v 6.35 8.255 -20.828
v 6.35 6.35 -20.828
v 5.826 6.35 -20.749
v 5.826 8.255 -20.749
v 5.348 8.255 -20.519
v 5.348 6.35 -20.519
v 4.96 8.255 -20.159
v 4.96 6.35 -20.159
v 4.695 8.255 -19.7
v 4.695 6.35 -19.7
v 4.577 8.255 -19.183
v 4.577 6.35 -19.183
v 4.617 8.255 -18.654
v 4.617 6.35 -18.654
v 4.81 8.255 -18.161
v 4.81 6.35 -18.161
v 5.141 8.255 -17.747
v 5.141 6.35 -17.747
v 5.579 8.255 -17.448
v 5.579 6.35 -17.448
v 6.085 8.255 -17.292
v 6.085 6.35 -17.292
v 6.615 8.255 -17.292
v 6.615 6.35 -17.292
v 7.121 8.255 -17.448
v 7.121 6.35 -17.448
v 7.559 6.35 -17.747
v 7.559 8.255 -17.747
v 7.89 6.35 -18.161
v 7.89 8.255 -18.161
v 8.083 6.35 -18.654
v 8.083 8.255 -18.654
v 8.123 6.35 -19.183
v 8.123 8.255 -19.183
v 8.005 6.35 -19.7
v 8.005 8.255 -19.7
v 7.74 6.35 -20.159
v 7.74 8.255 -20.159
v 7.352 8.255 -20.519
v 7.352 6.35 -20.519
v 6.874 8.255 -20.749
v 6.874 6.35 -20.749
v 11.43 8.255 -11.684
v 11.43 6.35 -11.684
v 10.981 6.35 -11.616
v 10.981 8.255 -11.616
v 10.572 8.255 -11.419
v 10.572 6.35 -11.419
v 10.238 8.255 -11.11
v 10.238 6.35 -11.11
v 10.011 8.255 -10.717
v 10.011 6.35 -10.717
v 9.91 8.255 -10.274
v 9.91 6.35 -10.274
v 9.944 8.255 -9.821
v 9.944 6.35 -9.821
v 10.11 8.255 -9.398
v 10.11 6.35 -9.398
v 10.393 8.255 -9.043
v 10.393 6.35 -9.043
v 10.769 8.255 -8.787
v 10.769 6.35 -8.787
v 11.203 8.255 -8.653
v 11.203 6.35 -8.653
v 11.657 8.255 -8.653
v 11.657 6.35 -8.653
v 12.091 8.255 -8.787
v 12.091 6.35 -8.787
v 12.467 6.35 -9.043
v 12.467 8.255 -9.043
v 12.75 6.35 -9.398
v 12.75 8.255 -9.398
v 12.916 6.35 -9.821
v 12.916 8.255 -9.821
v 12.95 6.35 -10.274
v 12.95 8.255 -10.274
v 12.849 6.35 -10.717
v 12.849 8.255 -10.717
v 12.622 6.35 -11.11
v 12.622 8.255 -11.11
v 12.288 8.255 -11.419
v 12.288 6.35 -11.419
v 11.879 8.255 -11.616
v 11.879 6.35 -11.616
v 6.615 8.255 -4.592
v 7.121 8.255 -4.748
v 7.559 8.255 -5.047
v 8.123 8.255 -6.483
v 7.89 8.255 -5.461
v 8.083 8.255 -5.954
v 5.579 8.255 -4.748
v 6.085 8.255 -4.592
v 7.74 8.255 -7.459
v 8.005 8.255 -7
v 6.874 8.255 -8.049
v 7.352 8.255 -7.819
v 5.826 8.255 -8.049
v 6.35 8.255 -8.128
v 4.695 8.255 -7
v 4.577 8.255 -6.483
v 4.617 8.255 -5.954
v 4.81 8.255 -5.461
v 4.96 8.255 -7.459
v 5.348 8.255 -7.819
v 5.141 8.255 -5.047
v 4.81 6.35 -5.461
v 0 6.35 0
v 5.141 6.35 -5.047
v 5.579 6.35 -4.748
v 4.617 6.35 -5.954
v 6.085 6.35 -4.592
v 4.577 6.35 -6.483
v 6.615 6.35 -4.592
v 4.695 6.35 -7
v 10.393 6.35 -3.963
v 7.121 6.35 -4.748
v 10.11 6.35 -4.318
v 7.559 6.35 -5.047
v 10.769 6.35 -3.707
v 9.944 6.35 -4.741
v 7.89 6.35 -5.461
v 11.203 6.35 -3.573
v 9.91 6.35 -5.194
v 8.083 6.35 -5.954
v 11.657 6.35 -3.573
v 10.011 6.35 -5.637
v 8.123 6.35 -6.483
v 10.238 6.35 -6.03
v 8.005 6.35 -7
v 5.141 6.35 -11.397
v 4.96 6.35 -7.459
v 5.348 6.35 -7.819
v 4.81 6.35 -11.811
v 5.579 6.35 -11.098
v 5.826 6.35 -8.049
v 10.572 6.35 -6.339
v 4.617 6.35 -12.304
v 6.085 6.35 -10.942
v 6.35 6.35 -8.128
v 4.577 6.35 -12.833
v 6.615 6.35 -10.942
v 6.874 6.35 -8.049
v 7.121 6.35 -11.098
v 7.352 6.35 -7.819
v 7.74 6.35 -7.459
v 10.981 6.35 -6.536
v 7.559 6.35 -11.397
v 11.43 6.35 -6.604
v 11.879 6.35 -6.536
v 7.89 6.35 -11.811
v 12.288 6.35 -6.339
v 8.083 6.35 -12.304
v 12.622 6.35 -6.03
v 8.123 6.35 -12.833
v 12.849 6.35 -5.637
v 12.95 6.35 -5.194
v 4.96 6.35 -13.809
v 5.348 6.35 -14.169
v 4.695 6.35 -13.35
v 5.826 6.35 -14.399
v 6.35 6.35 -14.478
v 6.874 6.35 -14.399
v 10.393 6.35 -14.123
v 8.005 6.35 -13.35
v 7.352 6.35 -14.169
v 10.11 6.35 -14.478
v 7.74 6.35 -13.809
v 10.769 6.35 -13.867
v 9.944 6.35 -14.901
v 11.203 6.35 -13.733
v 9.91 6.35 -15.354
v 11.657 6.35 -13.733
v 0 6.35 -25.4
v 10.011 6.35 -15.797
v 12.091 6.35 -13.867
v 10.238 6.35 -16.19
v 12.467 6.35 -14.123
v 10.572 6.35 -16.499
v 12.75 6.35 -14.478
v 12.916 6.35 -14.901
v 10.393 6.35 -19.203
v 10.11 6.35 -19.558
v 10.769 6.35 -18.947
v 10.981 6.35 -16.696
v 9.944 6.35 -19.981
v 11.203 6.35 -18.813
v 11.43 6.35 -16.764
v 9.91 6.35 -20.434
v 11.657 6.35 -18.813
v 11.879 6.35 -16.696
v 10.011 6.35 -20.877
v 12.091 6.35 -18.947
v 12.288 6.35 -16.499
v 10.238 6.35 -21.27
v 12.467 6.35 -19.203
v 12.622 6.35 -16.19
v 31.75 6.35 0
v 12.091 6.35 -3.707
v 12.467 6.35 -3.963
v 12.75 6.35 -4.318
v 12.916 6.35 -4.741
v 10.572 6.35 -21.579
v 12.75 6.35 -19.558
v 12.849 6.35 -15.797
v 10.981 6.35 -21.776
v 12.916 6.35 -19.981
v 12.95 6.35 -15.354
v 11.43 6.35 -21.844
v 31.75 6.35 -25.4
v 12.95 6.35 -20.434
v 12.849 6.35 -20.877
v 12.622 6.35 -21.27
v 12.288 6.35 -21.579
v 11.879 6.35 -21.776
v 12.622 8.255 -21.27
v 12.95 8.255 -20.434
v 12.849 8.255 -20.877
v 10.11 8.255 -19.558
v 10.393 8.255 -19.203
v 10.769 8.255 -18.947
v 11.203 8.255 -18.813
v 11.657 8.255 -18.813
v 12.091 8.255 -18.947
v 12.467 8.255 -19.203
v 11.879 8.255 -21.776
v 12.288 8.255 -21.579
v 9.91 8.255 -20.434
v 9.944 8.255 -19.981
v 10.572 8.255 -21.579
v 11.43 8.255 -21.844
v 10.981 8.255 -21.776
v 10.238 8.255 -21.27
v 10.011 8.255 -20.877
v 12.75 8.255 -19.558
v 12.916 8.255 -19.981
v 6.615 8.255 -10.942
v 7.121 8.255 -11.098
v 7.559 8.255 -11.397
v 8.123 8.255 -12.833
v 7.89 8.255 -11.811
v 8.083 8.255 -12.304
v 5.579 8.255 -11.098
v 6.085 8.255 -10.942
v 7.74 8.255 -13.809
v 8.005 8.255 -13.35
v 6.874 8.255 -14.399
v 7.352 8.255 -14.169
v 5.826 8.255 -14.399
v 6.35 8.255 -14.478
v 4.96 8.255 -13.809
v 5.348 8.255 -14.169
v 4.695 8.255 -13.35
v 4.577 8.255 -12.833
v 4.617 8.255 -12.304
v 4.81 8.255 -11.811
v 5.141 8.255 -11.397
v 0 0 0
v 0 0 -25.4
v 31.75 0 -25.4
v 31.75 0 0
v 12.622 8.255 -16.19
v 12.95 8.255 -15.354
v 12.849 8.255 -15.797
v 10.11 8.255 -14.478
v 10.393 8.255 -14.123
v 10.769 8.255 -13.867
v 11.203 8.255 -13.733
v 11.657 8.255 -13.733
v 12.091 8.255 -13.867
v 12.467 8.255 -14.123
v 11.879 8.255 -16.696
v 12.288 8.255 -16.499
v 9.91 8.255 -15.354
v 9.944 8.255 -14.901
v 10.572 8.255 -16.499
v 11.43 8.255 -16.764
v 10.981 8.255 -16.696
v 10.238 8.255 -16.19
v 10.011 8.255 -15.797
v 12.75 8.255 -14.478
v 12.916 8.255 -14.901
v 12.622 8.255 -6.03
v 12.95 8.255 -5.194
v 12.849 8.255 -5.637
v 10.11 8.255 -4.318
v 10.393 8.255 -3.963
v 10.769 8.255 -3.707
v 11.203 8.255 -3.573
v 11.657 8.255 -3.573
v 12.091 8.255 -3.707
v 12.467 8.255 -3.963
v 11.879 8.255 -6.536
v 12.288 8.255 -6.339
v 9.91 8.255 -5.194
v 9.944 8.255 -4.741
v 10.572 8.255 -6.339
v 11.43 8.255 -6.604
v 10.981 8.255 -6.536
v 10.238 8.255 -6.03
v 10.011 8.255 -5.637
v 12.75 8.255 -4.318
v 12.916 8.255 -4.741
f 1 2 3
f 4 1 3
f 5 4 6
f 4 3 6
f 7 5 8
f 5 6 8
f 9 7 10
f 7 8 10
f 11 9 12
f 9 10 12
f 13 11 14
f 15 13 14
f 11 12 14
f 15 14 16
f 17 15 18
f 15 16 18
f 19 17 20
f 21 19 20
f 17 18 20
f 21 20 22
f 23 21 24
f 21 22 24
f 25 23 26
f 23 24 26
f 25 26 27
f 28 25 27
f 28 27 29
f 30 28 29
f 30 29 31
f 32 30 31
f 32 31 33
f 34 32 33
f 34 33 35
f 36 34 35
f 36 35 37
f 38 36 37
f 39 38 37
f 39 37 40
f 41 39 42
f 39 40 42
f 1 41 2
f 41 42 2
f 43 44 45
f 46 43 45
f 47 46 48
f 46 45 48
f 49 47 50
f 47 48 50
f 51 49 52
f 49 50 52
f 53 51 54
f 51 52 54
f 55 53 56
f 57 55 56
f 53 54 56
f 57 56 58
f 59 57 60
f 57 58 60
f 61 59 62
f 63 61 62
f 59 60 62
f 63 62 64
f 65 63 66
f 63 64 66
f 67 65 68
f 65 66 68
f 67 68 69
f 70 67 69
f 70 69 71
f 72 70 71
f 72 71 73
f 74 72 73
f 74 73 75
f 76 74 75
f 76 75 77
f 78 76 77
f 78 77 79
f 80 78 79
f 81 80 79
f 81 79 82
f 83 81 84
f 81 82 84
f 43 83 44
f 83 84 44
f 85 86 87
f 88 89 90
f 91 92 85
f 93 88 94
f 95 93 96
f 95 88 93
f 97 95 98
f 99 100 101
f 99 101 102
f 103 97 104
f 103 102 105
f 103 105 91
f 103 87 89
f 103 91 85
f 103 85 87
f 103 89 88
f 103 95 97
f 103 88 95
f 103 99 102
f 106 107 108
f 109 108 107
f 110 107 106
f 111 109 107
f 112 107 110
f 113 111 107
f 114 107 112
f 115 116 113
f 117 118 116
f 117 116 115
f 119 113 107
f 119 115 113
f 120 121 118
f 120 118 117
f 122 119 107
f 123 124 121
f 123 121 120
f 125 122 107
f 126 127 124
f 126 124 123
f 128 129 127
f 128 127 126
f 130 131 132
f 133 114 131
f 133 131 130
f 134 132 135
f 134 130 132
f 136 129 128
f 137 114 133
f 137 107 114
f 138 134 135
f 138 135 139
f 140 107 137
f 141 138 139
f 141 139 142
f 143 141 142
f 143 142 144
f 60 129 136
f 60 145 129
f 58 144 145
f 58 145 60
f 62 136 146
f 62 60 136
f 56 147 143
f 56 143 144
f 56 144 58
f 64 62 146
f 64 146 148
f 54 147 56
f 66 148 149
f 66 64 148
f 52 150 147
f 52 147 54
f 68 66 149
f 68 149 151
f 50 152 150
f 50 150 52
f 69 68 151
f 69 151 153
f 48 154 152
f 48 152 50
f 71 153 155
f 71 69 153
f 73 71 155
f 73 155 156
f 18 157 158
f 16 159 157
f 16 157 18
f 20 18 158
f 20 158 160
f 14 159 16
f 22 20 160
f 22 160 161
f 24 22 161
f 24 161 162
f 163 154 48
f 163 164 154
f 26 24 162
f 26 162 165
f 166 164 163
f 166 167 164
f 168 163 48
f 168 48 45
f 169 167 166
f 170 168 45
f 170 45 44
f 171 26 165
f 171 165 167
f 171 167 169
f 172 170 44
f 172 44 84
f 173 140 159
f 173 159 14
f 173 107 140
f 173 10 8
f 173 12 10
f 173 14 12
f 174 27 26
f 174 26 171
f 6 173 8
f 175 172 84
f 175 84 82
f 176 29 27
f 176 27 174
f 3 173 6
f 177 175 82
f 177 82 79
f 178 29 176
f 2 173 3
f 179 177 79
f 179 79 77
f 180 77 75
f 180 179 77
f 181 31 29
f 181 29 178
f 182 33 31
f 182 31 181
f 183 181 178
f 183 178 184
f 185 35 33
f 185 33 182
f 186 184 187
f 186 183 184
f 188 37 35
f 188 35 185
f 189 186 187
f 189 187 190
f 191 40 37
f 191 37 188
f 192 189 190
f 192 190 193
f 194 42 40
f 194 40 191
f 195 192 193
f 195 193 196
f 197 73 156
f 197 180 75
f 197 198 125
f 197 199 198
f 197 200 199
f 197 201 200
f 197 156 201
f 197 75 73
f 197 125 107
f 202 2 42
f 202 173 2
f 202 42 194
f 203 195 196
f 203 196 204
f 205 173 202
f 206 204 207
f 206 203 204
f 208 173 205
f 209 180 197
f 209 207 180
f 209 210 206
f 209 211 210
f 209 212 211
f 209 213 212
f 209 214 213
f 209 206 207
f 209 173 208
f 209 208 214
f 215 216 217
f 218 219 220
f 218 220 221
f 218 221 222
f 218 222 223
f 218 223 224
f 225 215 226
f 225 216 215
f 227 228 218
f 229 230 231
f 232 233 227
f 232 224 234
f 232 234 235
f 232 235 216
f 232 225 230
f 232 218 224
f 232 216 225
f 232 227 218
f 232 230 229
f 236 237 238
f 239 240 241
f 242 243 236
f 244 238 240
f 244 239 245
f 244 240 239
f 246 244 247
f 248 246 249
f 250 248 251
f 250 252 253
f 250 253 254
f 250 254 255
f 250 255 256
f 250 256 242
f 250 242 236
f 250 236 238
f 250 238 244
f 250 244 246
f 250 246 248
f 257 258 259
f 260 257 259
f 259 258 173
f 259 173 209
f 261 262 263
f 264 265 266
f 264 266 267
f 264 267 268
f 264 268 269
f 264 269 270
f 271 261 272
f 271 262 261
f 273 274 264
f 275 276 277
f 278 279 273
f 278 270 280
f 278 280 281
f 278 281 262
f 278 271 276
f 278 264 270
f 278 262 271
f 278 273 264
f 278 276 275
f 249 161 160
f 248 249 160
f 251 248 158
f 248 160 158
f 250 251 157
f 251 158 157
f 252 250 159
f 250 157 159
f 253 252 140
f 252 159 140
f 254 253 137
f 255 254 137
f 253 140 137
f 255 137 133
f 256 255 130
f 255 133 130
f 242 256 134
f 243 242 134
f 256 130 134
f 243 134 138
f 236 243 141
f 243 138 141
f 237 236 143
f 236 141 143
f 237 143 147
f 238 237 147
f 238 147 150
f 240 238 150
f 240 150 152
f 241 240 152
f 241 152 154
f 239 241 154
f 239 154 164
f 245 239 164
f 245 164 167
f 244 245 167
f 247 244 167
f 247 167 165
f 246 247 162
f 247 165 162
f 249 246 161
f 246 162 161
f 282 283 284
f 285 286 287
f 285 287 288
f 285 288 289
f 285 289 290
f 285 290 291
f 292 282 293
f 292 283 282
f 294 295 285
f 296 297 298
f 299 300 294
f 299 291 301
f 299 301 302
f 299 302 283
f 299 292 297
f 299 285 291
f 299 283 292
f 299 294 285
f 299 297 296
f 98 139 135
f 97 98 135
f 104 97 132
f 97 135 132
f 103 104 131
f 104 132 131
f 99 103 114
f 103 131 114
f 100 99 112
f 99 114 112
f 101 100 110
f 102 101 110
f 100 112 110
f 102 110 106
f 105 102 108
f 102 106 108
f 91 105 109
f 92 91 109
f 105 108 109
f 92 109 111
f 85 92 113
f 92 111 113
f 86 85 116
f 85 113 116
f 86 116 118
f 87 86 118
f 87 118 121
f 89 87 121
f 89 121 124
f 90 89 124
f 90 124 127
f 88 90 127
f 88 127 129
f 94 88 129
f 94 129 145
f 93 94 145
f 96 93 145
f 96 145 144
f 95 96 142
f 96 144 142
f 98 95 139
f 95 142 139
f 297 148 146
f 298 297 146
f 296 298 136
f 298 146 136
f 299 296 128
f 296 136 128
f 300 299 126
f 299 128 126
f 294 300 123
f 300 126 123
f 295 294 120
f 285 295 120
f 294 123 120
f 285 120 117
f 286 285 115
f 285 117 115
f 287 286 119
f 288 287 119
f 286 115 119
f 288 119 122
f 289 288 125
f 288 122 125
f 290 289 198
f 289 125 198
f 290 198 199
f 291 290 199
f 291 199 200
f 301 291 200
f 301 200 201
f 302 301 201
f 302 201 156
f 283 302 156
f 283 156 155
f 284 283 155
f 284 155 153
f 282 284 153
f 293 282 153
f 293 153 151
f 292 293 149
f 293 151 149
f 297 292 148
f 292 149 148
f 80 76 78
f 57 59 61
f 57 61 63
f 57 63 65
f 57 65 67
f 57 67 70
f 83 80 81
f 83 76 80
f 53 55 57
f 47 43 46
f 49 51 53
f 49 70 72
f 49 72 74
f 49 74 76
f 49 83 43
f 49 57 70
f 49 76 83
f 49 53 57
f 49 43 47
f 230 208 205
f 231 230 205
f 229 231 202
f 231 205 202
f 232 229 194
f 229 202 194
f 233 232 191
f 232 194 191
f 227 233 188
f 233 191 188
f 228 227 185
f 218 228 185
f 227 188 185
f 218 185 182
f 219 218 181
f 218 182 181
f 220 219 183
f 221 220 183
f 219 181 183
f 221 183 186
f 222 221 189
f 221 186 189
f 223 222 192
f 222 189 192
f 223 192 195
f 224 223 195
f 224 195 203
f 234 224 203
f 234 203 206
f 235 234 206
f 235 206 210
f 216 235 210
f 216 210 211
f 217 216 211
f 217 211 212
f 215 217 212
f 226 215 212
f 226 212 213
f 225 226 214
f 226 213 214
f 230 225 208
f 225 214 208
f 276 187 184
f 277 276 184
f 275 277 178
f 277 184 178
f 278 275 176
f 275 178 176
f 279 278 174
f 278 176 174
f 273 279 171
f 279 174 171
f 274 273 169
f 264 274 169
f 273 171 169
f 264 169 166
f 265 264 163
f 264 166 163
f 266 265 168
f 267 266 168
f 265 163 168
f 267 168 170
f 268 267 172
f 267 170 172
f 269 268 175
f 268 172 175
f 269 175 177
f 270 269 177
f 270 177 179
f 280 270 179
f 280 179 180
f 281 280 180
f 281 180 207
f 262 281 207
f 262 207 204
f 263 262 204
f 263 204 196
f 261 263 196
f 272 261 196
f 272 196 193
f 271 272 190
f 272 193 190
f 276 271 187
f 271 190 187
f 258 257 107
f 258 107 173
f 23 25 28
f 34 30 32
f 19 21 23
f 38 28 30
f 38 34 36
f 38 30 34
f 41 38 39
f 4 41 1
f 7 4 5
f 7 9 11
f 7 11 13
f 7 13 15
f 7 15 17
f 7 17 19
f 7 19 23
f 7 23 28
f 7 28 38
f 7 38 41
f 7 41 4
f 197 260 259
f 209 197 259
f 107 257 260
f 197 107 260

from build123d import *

# Parameters (mm, degrees)
SKETCH2_W           = 31.75
SKETCH2_H           = 25.4
BOSS_EXTRUDE1_DEPTH = 6.35
SKETCH4_R           = 1.778
SKETCH4_R_2         = 1.524
BOSS_EXTRUDE2_DEPTH = 1.905


with BuildPart() as part:
    # Sketch2 → Boss-Extrude1 (new body)
    with BuildSketch(Plane(origin=(0, 0, 0), x_dir=(1, 0, 0), z_dir=(0, 1, 0))):
        with Locations((15.875, 12.7)):
            Rectangle(SKETCH2_W, SKETCH2_H)
    extrude(amount=BOSS_EXTRUDE1_DEPTH)

    # Sketch4 → Boss-Extrude2 (add)
    with BuildSketch(Plane(origin=(0, 6.35, 0), x_dir=(1, 0, 0), z_dir=(0, 1, 0))):
        with Locations(Location((6.35, 6.35, 0), (0, 0, 90))):
            Circle(SKETCH4_R)
        with Locations(Location((6.35, 12.7, 0), (0, 0, 90))):
            Circle(SKETCH4_R)
        with Locations(Location((6.35, 19.05, 0), (0, 0, 90))):
            Circle(SKETCH4_R)
        with Locations(Location((11.43, 20.32, 0), (0, 0, 90))):
            Circle(SKETCH4_R_2)
        with Locations(Location((11.43, 15.24, 0), (0, 0, 90))):
            Circle(SKETCH4_R_2)
        with Locations(Location((11.43, 10.16, 0), (0, 0, 90))):
            Circle(SKETCH4_R_2)
        with Locations(Location((11.43, 5.08, 0), (0, 0, 90))):
            Circle(SKETCH4_R_2)
    extrude(amount=BOSS_EXTRUDE2_DEPTH)


solid = part.part
